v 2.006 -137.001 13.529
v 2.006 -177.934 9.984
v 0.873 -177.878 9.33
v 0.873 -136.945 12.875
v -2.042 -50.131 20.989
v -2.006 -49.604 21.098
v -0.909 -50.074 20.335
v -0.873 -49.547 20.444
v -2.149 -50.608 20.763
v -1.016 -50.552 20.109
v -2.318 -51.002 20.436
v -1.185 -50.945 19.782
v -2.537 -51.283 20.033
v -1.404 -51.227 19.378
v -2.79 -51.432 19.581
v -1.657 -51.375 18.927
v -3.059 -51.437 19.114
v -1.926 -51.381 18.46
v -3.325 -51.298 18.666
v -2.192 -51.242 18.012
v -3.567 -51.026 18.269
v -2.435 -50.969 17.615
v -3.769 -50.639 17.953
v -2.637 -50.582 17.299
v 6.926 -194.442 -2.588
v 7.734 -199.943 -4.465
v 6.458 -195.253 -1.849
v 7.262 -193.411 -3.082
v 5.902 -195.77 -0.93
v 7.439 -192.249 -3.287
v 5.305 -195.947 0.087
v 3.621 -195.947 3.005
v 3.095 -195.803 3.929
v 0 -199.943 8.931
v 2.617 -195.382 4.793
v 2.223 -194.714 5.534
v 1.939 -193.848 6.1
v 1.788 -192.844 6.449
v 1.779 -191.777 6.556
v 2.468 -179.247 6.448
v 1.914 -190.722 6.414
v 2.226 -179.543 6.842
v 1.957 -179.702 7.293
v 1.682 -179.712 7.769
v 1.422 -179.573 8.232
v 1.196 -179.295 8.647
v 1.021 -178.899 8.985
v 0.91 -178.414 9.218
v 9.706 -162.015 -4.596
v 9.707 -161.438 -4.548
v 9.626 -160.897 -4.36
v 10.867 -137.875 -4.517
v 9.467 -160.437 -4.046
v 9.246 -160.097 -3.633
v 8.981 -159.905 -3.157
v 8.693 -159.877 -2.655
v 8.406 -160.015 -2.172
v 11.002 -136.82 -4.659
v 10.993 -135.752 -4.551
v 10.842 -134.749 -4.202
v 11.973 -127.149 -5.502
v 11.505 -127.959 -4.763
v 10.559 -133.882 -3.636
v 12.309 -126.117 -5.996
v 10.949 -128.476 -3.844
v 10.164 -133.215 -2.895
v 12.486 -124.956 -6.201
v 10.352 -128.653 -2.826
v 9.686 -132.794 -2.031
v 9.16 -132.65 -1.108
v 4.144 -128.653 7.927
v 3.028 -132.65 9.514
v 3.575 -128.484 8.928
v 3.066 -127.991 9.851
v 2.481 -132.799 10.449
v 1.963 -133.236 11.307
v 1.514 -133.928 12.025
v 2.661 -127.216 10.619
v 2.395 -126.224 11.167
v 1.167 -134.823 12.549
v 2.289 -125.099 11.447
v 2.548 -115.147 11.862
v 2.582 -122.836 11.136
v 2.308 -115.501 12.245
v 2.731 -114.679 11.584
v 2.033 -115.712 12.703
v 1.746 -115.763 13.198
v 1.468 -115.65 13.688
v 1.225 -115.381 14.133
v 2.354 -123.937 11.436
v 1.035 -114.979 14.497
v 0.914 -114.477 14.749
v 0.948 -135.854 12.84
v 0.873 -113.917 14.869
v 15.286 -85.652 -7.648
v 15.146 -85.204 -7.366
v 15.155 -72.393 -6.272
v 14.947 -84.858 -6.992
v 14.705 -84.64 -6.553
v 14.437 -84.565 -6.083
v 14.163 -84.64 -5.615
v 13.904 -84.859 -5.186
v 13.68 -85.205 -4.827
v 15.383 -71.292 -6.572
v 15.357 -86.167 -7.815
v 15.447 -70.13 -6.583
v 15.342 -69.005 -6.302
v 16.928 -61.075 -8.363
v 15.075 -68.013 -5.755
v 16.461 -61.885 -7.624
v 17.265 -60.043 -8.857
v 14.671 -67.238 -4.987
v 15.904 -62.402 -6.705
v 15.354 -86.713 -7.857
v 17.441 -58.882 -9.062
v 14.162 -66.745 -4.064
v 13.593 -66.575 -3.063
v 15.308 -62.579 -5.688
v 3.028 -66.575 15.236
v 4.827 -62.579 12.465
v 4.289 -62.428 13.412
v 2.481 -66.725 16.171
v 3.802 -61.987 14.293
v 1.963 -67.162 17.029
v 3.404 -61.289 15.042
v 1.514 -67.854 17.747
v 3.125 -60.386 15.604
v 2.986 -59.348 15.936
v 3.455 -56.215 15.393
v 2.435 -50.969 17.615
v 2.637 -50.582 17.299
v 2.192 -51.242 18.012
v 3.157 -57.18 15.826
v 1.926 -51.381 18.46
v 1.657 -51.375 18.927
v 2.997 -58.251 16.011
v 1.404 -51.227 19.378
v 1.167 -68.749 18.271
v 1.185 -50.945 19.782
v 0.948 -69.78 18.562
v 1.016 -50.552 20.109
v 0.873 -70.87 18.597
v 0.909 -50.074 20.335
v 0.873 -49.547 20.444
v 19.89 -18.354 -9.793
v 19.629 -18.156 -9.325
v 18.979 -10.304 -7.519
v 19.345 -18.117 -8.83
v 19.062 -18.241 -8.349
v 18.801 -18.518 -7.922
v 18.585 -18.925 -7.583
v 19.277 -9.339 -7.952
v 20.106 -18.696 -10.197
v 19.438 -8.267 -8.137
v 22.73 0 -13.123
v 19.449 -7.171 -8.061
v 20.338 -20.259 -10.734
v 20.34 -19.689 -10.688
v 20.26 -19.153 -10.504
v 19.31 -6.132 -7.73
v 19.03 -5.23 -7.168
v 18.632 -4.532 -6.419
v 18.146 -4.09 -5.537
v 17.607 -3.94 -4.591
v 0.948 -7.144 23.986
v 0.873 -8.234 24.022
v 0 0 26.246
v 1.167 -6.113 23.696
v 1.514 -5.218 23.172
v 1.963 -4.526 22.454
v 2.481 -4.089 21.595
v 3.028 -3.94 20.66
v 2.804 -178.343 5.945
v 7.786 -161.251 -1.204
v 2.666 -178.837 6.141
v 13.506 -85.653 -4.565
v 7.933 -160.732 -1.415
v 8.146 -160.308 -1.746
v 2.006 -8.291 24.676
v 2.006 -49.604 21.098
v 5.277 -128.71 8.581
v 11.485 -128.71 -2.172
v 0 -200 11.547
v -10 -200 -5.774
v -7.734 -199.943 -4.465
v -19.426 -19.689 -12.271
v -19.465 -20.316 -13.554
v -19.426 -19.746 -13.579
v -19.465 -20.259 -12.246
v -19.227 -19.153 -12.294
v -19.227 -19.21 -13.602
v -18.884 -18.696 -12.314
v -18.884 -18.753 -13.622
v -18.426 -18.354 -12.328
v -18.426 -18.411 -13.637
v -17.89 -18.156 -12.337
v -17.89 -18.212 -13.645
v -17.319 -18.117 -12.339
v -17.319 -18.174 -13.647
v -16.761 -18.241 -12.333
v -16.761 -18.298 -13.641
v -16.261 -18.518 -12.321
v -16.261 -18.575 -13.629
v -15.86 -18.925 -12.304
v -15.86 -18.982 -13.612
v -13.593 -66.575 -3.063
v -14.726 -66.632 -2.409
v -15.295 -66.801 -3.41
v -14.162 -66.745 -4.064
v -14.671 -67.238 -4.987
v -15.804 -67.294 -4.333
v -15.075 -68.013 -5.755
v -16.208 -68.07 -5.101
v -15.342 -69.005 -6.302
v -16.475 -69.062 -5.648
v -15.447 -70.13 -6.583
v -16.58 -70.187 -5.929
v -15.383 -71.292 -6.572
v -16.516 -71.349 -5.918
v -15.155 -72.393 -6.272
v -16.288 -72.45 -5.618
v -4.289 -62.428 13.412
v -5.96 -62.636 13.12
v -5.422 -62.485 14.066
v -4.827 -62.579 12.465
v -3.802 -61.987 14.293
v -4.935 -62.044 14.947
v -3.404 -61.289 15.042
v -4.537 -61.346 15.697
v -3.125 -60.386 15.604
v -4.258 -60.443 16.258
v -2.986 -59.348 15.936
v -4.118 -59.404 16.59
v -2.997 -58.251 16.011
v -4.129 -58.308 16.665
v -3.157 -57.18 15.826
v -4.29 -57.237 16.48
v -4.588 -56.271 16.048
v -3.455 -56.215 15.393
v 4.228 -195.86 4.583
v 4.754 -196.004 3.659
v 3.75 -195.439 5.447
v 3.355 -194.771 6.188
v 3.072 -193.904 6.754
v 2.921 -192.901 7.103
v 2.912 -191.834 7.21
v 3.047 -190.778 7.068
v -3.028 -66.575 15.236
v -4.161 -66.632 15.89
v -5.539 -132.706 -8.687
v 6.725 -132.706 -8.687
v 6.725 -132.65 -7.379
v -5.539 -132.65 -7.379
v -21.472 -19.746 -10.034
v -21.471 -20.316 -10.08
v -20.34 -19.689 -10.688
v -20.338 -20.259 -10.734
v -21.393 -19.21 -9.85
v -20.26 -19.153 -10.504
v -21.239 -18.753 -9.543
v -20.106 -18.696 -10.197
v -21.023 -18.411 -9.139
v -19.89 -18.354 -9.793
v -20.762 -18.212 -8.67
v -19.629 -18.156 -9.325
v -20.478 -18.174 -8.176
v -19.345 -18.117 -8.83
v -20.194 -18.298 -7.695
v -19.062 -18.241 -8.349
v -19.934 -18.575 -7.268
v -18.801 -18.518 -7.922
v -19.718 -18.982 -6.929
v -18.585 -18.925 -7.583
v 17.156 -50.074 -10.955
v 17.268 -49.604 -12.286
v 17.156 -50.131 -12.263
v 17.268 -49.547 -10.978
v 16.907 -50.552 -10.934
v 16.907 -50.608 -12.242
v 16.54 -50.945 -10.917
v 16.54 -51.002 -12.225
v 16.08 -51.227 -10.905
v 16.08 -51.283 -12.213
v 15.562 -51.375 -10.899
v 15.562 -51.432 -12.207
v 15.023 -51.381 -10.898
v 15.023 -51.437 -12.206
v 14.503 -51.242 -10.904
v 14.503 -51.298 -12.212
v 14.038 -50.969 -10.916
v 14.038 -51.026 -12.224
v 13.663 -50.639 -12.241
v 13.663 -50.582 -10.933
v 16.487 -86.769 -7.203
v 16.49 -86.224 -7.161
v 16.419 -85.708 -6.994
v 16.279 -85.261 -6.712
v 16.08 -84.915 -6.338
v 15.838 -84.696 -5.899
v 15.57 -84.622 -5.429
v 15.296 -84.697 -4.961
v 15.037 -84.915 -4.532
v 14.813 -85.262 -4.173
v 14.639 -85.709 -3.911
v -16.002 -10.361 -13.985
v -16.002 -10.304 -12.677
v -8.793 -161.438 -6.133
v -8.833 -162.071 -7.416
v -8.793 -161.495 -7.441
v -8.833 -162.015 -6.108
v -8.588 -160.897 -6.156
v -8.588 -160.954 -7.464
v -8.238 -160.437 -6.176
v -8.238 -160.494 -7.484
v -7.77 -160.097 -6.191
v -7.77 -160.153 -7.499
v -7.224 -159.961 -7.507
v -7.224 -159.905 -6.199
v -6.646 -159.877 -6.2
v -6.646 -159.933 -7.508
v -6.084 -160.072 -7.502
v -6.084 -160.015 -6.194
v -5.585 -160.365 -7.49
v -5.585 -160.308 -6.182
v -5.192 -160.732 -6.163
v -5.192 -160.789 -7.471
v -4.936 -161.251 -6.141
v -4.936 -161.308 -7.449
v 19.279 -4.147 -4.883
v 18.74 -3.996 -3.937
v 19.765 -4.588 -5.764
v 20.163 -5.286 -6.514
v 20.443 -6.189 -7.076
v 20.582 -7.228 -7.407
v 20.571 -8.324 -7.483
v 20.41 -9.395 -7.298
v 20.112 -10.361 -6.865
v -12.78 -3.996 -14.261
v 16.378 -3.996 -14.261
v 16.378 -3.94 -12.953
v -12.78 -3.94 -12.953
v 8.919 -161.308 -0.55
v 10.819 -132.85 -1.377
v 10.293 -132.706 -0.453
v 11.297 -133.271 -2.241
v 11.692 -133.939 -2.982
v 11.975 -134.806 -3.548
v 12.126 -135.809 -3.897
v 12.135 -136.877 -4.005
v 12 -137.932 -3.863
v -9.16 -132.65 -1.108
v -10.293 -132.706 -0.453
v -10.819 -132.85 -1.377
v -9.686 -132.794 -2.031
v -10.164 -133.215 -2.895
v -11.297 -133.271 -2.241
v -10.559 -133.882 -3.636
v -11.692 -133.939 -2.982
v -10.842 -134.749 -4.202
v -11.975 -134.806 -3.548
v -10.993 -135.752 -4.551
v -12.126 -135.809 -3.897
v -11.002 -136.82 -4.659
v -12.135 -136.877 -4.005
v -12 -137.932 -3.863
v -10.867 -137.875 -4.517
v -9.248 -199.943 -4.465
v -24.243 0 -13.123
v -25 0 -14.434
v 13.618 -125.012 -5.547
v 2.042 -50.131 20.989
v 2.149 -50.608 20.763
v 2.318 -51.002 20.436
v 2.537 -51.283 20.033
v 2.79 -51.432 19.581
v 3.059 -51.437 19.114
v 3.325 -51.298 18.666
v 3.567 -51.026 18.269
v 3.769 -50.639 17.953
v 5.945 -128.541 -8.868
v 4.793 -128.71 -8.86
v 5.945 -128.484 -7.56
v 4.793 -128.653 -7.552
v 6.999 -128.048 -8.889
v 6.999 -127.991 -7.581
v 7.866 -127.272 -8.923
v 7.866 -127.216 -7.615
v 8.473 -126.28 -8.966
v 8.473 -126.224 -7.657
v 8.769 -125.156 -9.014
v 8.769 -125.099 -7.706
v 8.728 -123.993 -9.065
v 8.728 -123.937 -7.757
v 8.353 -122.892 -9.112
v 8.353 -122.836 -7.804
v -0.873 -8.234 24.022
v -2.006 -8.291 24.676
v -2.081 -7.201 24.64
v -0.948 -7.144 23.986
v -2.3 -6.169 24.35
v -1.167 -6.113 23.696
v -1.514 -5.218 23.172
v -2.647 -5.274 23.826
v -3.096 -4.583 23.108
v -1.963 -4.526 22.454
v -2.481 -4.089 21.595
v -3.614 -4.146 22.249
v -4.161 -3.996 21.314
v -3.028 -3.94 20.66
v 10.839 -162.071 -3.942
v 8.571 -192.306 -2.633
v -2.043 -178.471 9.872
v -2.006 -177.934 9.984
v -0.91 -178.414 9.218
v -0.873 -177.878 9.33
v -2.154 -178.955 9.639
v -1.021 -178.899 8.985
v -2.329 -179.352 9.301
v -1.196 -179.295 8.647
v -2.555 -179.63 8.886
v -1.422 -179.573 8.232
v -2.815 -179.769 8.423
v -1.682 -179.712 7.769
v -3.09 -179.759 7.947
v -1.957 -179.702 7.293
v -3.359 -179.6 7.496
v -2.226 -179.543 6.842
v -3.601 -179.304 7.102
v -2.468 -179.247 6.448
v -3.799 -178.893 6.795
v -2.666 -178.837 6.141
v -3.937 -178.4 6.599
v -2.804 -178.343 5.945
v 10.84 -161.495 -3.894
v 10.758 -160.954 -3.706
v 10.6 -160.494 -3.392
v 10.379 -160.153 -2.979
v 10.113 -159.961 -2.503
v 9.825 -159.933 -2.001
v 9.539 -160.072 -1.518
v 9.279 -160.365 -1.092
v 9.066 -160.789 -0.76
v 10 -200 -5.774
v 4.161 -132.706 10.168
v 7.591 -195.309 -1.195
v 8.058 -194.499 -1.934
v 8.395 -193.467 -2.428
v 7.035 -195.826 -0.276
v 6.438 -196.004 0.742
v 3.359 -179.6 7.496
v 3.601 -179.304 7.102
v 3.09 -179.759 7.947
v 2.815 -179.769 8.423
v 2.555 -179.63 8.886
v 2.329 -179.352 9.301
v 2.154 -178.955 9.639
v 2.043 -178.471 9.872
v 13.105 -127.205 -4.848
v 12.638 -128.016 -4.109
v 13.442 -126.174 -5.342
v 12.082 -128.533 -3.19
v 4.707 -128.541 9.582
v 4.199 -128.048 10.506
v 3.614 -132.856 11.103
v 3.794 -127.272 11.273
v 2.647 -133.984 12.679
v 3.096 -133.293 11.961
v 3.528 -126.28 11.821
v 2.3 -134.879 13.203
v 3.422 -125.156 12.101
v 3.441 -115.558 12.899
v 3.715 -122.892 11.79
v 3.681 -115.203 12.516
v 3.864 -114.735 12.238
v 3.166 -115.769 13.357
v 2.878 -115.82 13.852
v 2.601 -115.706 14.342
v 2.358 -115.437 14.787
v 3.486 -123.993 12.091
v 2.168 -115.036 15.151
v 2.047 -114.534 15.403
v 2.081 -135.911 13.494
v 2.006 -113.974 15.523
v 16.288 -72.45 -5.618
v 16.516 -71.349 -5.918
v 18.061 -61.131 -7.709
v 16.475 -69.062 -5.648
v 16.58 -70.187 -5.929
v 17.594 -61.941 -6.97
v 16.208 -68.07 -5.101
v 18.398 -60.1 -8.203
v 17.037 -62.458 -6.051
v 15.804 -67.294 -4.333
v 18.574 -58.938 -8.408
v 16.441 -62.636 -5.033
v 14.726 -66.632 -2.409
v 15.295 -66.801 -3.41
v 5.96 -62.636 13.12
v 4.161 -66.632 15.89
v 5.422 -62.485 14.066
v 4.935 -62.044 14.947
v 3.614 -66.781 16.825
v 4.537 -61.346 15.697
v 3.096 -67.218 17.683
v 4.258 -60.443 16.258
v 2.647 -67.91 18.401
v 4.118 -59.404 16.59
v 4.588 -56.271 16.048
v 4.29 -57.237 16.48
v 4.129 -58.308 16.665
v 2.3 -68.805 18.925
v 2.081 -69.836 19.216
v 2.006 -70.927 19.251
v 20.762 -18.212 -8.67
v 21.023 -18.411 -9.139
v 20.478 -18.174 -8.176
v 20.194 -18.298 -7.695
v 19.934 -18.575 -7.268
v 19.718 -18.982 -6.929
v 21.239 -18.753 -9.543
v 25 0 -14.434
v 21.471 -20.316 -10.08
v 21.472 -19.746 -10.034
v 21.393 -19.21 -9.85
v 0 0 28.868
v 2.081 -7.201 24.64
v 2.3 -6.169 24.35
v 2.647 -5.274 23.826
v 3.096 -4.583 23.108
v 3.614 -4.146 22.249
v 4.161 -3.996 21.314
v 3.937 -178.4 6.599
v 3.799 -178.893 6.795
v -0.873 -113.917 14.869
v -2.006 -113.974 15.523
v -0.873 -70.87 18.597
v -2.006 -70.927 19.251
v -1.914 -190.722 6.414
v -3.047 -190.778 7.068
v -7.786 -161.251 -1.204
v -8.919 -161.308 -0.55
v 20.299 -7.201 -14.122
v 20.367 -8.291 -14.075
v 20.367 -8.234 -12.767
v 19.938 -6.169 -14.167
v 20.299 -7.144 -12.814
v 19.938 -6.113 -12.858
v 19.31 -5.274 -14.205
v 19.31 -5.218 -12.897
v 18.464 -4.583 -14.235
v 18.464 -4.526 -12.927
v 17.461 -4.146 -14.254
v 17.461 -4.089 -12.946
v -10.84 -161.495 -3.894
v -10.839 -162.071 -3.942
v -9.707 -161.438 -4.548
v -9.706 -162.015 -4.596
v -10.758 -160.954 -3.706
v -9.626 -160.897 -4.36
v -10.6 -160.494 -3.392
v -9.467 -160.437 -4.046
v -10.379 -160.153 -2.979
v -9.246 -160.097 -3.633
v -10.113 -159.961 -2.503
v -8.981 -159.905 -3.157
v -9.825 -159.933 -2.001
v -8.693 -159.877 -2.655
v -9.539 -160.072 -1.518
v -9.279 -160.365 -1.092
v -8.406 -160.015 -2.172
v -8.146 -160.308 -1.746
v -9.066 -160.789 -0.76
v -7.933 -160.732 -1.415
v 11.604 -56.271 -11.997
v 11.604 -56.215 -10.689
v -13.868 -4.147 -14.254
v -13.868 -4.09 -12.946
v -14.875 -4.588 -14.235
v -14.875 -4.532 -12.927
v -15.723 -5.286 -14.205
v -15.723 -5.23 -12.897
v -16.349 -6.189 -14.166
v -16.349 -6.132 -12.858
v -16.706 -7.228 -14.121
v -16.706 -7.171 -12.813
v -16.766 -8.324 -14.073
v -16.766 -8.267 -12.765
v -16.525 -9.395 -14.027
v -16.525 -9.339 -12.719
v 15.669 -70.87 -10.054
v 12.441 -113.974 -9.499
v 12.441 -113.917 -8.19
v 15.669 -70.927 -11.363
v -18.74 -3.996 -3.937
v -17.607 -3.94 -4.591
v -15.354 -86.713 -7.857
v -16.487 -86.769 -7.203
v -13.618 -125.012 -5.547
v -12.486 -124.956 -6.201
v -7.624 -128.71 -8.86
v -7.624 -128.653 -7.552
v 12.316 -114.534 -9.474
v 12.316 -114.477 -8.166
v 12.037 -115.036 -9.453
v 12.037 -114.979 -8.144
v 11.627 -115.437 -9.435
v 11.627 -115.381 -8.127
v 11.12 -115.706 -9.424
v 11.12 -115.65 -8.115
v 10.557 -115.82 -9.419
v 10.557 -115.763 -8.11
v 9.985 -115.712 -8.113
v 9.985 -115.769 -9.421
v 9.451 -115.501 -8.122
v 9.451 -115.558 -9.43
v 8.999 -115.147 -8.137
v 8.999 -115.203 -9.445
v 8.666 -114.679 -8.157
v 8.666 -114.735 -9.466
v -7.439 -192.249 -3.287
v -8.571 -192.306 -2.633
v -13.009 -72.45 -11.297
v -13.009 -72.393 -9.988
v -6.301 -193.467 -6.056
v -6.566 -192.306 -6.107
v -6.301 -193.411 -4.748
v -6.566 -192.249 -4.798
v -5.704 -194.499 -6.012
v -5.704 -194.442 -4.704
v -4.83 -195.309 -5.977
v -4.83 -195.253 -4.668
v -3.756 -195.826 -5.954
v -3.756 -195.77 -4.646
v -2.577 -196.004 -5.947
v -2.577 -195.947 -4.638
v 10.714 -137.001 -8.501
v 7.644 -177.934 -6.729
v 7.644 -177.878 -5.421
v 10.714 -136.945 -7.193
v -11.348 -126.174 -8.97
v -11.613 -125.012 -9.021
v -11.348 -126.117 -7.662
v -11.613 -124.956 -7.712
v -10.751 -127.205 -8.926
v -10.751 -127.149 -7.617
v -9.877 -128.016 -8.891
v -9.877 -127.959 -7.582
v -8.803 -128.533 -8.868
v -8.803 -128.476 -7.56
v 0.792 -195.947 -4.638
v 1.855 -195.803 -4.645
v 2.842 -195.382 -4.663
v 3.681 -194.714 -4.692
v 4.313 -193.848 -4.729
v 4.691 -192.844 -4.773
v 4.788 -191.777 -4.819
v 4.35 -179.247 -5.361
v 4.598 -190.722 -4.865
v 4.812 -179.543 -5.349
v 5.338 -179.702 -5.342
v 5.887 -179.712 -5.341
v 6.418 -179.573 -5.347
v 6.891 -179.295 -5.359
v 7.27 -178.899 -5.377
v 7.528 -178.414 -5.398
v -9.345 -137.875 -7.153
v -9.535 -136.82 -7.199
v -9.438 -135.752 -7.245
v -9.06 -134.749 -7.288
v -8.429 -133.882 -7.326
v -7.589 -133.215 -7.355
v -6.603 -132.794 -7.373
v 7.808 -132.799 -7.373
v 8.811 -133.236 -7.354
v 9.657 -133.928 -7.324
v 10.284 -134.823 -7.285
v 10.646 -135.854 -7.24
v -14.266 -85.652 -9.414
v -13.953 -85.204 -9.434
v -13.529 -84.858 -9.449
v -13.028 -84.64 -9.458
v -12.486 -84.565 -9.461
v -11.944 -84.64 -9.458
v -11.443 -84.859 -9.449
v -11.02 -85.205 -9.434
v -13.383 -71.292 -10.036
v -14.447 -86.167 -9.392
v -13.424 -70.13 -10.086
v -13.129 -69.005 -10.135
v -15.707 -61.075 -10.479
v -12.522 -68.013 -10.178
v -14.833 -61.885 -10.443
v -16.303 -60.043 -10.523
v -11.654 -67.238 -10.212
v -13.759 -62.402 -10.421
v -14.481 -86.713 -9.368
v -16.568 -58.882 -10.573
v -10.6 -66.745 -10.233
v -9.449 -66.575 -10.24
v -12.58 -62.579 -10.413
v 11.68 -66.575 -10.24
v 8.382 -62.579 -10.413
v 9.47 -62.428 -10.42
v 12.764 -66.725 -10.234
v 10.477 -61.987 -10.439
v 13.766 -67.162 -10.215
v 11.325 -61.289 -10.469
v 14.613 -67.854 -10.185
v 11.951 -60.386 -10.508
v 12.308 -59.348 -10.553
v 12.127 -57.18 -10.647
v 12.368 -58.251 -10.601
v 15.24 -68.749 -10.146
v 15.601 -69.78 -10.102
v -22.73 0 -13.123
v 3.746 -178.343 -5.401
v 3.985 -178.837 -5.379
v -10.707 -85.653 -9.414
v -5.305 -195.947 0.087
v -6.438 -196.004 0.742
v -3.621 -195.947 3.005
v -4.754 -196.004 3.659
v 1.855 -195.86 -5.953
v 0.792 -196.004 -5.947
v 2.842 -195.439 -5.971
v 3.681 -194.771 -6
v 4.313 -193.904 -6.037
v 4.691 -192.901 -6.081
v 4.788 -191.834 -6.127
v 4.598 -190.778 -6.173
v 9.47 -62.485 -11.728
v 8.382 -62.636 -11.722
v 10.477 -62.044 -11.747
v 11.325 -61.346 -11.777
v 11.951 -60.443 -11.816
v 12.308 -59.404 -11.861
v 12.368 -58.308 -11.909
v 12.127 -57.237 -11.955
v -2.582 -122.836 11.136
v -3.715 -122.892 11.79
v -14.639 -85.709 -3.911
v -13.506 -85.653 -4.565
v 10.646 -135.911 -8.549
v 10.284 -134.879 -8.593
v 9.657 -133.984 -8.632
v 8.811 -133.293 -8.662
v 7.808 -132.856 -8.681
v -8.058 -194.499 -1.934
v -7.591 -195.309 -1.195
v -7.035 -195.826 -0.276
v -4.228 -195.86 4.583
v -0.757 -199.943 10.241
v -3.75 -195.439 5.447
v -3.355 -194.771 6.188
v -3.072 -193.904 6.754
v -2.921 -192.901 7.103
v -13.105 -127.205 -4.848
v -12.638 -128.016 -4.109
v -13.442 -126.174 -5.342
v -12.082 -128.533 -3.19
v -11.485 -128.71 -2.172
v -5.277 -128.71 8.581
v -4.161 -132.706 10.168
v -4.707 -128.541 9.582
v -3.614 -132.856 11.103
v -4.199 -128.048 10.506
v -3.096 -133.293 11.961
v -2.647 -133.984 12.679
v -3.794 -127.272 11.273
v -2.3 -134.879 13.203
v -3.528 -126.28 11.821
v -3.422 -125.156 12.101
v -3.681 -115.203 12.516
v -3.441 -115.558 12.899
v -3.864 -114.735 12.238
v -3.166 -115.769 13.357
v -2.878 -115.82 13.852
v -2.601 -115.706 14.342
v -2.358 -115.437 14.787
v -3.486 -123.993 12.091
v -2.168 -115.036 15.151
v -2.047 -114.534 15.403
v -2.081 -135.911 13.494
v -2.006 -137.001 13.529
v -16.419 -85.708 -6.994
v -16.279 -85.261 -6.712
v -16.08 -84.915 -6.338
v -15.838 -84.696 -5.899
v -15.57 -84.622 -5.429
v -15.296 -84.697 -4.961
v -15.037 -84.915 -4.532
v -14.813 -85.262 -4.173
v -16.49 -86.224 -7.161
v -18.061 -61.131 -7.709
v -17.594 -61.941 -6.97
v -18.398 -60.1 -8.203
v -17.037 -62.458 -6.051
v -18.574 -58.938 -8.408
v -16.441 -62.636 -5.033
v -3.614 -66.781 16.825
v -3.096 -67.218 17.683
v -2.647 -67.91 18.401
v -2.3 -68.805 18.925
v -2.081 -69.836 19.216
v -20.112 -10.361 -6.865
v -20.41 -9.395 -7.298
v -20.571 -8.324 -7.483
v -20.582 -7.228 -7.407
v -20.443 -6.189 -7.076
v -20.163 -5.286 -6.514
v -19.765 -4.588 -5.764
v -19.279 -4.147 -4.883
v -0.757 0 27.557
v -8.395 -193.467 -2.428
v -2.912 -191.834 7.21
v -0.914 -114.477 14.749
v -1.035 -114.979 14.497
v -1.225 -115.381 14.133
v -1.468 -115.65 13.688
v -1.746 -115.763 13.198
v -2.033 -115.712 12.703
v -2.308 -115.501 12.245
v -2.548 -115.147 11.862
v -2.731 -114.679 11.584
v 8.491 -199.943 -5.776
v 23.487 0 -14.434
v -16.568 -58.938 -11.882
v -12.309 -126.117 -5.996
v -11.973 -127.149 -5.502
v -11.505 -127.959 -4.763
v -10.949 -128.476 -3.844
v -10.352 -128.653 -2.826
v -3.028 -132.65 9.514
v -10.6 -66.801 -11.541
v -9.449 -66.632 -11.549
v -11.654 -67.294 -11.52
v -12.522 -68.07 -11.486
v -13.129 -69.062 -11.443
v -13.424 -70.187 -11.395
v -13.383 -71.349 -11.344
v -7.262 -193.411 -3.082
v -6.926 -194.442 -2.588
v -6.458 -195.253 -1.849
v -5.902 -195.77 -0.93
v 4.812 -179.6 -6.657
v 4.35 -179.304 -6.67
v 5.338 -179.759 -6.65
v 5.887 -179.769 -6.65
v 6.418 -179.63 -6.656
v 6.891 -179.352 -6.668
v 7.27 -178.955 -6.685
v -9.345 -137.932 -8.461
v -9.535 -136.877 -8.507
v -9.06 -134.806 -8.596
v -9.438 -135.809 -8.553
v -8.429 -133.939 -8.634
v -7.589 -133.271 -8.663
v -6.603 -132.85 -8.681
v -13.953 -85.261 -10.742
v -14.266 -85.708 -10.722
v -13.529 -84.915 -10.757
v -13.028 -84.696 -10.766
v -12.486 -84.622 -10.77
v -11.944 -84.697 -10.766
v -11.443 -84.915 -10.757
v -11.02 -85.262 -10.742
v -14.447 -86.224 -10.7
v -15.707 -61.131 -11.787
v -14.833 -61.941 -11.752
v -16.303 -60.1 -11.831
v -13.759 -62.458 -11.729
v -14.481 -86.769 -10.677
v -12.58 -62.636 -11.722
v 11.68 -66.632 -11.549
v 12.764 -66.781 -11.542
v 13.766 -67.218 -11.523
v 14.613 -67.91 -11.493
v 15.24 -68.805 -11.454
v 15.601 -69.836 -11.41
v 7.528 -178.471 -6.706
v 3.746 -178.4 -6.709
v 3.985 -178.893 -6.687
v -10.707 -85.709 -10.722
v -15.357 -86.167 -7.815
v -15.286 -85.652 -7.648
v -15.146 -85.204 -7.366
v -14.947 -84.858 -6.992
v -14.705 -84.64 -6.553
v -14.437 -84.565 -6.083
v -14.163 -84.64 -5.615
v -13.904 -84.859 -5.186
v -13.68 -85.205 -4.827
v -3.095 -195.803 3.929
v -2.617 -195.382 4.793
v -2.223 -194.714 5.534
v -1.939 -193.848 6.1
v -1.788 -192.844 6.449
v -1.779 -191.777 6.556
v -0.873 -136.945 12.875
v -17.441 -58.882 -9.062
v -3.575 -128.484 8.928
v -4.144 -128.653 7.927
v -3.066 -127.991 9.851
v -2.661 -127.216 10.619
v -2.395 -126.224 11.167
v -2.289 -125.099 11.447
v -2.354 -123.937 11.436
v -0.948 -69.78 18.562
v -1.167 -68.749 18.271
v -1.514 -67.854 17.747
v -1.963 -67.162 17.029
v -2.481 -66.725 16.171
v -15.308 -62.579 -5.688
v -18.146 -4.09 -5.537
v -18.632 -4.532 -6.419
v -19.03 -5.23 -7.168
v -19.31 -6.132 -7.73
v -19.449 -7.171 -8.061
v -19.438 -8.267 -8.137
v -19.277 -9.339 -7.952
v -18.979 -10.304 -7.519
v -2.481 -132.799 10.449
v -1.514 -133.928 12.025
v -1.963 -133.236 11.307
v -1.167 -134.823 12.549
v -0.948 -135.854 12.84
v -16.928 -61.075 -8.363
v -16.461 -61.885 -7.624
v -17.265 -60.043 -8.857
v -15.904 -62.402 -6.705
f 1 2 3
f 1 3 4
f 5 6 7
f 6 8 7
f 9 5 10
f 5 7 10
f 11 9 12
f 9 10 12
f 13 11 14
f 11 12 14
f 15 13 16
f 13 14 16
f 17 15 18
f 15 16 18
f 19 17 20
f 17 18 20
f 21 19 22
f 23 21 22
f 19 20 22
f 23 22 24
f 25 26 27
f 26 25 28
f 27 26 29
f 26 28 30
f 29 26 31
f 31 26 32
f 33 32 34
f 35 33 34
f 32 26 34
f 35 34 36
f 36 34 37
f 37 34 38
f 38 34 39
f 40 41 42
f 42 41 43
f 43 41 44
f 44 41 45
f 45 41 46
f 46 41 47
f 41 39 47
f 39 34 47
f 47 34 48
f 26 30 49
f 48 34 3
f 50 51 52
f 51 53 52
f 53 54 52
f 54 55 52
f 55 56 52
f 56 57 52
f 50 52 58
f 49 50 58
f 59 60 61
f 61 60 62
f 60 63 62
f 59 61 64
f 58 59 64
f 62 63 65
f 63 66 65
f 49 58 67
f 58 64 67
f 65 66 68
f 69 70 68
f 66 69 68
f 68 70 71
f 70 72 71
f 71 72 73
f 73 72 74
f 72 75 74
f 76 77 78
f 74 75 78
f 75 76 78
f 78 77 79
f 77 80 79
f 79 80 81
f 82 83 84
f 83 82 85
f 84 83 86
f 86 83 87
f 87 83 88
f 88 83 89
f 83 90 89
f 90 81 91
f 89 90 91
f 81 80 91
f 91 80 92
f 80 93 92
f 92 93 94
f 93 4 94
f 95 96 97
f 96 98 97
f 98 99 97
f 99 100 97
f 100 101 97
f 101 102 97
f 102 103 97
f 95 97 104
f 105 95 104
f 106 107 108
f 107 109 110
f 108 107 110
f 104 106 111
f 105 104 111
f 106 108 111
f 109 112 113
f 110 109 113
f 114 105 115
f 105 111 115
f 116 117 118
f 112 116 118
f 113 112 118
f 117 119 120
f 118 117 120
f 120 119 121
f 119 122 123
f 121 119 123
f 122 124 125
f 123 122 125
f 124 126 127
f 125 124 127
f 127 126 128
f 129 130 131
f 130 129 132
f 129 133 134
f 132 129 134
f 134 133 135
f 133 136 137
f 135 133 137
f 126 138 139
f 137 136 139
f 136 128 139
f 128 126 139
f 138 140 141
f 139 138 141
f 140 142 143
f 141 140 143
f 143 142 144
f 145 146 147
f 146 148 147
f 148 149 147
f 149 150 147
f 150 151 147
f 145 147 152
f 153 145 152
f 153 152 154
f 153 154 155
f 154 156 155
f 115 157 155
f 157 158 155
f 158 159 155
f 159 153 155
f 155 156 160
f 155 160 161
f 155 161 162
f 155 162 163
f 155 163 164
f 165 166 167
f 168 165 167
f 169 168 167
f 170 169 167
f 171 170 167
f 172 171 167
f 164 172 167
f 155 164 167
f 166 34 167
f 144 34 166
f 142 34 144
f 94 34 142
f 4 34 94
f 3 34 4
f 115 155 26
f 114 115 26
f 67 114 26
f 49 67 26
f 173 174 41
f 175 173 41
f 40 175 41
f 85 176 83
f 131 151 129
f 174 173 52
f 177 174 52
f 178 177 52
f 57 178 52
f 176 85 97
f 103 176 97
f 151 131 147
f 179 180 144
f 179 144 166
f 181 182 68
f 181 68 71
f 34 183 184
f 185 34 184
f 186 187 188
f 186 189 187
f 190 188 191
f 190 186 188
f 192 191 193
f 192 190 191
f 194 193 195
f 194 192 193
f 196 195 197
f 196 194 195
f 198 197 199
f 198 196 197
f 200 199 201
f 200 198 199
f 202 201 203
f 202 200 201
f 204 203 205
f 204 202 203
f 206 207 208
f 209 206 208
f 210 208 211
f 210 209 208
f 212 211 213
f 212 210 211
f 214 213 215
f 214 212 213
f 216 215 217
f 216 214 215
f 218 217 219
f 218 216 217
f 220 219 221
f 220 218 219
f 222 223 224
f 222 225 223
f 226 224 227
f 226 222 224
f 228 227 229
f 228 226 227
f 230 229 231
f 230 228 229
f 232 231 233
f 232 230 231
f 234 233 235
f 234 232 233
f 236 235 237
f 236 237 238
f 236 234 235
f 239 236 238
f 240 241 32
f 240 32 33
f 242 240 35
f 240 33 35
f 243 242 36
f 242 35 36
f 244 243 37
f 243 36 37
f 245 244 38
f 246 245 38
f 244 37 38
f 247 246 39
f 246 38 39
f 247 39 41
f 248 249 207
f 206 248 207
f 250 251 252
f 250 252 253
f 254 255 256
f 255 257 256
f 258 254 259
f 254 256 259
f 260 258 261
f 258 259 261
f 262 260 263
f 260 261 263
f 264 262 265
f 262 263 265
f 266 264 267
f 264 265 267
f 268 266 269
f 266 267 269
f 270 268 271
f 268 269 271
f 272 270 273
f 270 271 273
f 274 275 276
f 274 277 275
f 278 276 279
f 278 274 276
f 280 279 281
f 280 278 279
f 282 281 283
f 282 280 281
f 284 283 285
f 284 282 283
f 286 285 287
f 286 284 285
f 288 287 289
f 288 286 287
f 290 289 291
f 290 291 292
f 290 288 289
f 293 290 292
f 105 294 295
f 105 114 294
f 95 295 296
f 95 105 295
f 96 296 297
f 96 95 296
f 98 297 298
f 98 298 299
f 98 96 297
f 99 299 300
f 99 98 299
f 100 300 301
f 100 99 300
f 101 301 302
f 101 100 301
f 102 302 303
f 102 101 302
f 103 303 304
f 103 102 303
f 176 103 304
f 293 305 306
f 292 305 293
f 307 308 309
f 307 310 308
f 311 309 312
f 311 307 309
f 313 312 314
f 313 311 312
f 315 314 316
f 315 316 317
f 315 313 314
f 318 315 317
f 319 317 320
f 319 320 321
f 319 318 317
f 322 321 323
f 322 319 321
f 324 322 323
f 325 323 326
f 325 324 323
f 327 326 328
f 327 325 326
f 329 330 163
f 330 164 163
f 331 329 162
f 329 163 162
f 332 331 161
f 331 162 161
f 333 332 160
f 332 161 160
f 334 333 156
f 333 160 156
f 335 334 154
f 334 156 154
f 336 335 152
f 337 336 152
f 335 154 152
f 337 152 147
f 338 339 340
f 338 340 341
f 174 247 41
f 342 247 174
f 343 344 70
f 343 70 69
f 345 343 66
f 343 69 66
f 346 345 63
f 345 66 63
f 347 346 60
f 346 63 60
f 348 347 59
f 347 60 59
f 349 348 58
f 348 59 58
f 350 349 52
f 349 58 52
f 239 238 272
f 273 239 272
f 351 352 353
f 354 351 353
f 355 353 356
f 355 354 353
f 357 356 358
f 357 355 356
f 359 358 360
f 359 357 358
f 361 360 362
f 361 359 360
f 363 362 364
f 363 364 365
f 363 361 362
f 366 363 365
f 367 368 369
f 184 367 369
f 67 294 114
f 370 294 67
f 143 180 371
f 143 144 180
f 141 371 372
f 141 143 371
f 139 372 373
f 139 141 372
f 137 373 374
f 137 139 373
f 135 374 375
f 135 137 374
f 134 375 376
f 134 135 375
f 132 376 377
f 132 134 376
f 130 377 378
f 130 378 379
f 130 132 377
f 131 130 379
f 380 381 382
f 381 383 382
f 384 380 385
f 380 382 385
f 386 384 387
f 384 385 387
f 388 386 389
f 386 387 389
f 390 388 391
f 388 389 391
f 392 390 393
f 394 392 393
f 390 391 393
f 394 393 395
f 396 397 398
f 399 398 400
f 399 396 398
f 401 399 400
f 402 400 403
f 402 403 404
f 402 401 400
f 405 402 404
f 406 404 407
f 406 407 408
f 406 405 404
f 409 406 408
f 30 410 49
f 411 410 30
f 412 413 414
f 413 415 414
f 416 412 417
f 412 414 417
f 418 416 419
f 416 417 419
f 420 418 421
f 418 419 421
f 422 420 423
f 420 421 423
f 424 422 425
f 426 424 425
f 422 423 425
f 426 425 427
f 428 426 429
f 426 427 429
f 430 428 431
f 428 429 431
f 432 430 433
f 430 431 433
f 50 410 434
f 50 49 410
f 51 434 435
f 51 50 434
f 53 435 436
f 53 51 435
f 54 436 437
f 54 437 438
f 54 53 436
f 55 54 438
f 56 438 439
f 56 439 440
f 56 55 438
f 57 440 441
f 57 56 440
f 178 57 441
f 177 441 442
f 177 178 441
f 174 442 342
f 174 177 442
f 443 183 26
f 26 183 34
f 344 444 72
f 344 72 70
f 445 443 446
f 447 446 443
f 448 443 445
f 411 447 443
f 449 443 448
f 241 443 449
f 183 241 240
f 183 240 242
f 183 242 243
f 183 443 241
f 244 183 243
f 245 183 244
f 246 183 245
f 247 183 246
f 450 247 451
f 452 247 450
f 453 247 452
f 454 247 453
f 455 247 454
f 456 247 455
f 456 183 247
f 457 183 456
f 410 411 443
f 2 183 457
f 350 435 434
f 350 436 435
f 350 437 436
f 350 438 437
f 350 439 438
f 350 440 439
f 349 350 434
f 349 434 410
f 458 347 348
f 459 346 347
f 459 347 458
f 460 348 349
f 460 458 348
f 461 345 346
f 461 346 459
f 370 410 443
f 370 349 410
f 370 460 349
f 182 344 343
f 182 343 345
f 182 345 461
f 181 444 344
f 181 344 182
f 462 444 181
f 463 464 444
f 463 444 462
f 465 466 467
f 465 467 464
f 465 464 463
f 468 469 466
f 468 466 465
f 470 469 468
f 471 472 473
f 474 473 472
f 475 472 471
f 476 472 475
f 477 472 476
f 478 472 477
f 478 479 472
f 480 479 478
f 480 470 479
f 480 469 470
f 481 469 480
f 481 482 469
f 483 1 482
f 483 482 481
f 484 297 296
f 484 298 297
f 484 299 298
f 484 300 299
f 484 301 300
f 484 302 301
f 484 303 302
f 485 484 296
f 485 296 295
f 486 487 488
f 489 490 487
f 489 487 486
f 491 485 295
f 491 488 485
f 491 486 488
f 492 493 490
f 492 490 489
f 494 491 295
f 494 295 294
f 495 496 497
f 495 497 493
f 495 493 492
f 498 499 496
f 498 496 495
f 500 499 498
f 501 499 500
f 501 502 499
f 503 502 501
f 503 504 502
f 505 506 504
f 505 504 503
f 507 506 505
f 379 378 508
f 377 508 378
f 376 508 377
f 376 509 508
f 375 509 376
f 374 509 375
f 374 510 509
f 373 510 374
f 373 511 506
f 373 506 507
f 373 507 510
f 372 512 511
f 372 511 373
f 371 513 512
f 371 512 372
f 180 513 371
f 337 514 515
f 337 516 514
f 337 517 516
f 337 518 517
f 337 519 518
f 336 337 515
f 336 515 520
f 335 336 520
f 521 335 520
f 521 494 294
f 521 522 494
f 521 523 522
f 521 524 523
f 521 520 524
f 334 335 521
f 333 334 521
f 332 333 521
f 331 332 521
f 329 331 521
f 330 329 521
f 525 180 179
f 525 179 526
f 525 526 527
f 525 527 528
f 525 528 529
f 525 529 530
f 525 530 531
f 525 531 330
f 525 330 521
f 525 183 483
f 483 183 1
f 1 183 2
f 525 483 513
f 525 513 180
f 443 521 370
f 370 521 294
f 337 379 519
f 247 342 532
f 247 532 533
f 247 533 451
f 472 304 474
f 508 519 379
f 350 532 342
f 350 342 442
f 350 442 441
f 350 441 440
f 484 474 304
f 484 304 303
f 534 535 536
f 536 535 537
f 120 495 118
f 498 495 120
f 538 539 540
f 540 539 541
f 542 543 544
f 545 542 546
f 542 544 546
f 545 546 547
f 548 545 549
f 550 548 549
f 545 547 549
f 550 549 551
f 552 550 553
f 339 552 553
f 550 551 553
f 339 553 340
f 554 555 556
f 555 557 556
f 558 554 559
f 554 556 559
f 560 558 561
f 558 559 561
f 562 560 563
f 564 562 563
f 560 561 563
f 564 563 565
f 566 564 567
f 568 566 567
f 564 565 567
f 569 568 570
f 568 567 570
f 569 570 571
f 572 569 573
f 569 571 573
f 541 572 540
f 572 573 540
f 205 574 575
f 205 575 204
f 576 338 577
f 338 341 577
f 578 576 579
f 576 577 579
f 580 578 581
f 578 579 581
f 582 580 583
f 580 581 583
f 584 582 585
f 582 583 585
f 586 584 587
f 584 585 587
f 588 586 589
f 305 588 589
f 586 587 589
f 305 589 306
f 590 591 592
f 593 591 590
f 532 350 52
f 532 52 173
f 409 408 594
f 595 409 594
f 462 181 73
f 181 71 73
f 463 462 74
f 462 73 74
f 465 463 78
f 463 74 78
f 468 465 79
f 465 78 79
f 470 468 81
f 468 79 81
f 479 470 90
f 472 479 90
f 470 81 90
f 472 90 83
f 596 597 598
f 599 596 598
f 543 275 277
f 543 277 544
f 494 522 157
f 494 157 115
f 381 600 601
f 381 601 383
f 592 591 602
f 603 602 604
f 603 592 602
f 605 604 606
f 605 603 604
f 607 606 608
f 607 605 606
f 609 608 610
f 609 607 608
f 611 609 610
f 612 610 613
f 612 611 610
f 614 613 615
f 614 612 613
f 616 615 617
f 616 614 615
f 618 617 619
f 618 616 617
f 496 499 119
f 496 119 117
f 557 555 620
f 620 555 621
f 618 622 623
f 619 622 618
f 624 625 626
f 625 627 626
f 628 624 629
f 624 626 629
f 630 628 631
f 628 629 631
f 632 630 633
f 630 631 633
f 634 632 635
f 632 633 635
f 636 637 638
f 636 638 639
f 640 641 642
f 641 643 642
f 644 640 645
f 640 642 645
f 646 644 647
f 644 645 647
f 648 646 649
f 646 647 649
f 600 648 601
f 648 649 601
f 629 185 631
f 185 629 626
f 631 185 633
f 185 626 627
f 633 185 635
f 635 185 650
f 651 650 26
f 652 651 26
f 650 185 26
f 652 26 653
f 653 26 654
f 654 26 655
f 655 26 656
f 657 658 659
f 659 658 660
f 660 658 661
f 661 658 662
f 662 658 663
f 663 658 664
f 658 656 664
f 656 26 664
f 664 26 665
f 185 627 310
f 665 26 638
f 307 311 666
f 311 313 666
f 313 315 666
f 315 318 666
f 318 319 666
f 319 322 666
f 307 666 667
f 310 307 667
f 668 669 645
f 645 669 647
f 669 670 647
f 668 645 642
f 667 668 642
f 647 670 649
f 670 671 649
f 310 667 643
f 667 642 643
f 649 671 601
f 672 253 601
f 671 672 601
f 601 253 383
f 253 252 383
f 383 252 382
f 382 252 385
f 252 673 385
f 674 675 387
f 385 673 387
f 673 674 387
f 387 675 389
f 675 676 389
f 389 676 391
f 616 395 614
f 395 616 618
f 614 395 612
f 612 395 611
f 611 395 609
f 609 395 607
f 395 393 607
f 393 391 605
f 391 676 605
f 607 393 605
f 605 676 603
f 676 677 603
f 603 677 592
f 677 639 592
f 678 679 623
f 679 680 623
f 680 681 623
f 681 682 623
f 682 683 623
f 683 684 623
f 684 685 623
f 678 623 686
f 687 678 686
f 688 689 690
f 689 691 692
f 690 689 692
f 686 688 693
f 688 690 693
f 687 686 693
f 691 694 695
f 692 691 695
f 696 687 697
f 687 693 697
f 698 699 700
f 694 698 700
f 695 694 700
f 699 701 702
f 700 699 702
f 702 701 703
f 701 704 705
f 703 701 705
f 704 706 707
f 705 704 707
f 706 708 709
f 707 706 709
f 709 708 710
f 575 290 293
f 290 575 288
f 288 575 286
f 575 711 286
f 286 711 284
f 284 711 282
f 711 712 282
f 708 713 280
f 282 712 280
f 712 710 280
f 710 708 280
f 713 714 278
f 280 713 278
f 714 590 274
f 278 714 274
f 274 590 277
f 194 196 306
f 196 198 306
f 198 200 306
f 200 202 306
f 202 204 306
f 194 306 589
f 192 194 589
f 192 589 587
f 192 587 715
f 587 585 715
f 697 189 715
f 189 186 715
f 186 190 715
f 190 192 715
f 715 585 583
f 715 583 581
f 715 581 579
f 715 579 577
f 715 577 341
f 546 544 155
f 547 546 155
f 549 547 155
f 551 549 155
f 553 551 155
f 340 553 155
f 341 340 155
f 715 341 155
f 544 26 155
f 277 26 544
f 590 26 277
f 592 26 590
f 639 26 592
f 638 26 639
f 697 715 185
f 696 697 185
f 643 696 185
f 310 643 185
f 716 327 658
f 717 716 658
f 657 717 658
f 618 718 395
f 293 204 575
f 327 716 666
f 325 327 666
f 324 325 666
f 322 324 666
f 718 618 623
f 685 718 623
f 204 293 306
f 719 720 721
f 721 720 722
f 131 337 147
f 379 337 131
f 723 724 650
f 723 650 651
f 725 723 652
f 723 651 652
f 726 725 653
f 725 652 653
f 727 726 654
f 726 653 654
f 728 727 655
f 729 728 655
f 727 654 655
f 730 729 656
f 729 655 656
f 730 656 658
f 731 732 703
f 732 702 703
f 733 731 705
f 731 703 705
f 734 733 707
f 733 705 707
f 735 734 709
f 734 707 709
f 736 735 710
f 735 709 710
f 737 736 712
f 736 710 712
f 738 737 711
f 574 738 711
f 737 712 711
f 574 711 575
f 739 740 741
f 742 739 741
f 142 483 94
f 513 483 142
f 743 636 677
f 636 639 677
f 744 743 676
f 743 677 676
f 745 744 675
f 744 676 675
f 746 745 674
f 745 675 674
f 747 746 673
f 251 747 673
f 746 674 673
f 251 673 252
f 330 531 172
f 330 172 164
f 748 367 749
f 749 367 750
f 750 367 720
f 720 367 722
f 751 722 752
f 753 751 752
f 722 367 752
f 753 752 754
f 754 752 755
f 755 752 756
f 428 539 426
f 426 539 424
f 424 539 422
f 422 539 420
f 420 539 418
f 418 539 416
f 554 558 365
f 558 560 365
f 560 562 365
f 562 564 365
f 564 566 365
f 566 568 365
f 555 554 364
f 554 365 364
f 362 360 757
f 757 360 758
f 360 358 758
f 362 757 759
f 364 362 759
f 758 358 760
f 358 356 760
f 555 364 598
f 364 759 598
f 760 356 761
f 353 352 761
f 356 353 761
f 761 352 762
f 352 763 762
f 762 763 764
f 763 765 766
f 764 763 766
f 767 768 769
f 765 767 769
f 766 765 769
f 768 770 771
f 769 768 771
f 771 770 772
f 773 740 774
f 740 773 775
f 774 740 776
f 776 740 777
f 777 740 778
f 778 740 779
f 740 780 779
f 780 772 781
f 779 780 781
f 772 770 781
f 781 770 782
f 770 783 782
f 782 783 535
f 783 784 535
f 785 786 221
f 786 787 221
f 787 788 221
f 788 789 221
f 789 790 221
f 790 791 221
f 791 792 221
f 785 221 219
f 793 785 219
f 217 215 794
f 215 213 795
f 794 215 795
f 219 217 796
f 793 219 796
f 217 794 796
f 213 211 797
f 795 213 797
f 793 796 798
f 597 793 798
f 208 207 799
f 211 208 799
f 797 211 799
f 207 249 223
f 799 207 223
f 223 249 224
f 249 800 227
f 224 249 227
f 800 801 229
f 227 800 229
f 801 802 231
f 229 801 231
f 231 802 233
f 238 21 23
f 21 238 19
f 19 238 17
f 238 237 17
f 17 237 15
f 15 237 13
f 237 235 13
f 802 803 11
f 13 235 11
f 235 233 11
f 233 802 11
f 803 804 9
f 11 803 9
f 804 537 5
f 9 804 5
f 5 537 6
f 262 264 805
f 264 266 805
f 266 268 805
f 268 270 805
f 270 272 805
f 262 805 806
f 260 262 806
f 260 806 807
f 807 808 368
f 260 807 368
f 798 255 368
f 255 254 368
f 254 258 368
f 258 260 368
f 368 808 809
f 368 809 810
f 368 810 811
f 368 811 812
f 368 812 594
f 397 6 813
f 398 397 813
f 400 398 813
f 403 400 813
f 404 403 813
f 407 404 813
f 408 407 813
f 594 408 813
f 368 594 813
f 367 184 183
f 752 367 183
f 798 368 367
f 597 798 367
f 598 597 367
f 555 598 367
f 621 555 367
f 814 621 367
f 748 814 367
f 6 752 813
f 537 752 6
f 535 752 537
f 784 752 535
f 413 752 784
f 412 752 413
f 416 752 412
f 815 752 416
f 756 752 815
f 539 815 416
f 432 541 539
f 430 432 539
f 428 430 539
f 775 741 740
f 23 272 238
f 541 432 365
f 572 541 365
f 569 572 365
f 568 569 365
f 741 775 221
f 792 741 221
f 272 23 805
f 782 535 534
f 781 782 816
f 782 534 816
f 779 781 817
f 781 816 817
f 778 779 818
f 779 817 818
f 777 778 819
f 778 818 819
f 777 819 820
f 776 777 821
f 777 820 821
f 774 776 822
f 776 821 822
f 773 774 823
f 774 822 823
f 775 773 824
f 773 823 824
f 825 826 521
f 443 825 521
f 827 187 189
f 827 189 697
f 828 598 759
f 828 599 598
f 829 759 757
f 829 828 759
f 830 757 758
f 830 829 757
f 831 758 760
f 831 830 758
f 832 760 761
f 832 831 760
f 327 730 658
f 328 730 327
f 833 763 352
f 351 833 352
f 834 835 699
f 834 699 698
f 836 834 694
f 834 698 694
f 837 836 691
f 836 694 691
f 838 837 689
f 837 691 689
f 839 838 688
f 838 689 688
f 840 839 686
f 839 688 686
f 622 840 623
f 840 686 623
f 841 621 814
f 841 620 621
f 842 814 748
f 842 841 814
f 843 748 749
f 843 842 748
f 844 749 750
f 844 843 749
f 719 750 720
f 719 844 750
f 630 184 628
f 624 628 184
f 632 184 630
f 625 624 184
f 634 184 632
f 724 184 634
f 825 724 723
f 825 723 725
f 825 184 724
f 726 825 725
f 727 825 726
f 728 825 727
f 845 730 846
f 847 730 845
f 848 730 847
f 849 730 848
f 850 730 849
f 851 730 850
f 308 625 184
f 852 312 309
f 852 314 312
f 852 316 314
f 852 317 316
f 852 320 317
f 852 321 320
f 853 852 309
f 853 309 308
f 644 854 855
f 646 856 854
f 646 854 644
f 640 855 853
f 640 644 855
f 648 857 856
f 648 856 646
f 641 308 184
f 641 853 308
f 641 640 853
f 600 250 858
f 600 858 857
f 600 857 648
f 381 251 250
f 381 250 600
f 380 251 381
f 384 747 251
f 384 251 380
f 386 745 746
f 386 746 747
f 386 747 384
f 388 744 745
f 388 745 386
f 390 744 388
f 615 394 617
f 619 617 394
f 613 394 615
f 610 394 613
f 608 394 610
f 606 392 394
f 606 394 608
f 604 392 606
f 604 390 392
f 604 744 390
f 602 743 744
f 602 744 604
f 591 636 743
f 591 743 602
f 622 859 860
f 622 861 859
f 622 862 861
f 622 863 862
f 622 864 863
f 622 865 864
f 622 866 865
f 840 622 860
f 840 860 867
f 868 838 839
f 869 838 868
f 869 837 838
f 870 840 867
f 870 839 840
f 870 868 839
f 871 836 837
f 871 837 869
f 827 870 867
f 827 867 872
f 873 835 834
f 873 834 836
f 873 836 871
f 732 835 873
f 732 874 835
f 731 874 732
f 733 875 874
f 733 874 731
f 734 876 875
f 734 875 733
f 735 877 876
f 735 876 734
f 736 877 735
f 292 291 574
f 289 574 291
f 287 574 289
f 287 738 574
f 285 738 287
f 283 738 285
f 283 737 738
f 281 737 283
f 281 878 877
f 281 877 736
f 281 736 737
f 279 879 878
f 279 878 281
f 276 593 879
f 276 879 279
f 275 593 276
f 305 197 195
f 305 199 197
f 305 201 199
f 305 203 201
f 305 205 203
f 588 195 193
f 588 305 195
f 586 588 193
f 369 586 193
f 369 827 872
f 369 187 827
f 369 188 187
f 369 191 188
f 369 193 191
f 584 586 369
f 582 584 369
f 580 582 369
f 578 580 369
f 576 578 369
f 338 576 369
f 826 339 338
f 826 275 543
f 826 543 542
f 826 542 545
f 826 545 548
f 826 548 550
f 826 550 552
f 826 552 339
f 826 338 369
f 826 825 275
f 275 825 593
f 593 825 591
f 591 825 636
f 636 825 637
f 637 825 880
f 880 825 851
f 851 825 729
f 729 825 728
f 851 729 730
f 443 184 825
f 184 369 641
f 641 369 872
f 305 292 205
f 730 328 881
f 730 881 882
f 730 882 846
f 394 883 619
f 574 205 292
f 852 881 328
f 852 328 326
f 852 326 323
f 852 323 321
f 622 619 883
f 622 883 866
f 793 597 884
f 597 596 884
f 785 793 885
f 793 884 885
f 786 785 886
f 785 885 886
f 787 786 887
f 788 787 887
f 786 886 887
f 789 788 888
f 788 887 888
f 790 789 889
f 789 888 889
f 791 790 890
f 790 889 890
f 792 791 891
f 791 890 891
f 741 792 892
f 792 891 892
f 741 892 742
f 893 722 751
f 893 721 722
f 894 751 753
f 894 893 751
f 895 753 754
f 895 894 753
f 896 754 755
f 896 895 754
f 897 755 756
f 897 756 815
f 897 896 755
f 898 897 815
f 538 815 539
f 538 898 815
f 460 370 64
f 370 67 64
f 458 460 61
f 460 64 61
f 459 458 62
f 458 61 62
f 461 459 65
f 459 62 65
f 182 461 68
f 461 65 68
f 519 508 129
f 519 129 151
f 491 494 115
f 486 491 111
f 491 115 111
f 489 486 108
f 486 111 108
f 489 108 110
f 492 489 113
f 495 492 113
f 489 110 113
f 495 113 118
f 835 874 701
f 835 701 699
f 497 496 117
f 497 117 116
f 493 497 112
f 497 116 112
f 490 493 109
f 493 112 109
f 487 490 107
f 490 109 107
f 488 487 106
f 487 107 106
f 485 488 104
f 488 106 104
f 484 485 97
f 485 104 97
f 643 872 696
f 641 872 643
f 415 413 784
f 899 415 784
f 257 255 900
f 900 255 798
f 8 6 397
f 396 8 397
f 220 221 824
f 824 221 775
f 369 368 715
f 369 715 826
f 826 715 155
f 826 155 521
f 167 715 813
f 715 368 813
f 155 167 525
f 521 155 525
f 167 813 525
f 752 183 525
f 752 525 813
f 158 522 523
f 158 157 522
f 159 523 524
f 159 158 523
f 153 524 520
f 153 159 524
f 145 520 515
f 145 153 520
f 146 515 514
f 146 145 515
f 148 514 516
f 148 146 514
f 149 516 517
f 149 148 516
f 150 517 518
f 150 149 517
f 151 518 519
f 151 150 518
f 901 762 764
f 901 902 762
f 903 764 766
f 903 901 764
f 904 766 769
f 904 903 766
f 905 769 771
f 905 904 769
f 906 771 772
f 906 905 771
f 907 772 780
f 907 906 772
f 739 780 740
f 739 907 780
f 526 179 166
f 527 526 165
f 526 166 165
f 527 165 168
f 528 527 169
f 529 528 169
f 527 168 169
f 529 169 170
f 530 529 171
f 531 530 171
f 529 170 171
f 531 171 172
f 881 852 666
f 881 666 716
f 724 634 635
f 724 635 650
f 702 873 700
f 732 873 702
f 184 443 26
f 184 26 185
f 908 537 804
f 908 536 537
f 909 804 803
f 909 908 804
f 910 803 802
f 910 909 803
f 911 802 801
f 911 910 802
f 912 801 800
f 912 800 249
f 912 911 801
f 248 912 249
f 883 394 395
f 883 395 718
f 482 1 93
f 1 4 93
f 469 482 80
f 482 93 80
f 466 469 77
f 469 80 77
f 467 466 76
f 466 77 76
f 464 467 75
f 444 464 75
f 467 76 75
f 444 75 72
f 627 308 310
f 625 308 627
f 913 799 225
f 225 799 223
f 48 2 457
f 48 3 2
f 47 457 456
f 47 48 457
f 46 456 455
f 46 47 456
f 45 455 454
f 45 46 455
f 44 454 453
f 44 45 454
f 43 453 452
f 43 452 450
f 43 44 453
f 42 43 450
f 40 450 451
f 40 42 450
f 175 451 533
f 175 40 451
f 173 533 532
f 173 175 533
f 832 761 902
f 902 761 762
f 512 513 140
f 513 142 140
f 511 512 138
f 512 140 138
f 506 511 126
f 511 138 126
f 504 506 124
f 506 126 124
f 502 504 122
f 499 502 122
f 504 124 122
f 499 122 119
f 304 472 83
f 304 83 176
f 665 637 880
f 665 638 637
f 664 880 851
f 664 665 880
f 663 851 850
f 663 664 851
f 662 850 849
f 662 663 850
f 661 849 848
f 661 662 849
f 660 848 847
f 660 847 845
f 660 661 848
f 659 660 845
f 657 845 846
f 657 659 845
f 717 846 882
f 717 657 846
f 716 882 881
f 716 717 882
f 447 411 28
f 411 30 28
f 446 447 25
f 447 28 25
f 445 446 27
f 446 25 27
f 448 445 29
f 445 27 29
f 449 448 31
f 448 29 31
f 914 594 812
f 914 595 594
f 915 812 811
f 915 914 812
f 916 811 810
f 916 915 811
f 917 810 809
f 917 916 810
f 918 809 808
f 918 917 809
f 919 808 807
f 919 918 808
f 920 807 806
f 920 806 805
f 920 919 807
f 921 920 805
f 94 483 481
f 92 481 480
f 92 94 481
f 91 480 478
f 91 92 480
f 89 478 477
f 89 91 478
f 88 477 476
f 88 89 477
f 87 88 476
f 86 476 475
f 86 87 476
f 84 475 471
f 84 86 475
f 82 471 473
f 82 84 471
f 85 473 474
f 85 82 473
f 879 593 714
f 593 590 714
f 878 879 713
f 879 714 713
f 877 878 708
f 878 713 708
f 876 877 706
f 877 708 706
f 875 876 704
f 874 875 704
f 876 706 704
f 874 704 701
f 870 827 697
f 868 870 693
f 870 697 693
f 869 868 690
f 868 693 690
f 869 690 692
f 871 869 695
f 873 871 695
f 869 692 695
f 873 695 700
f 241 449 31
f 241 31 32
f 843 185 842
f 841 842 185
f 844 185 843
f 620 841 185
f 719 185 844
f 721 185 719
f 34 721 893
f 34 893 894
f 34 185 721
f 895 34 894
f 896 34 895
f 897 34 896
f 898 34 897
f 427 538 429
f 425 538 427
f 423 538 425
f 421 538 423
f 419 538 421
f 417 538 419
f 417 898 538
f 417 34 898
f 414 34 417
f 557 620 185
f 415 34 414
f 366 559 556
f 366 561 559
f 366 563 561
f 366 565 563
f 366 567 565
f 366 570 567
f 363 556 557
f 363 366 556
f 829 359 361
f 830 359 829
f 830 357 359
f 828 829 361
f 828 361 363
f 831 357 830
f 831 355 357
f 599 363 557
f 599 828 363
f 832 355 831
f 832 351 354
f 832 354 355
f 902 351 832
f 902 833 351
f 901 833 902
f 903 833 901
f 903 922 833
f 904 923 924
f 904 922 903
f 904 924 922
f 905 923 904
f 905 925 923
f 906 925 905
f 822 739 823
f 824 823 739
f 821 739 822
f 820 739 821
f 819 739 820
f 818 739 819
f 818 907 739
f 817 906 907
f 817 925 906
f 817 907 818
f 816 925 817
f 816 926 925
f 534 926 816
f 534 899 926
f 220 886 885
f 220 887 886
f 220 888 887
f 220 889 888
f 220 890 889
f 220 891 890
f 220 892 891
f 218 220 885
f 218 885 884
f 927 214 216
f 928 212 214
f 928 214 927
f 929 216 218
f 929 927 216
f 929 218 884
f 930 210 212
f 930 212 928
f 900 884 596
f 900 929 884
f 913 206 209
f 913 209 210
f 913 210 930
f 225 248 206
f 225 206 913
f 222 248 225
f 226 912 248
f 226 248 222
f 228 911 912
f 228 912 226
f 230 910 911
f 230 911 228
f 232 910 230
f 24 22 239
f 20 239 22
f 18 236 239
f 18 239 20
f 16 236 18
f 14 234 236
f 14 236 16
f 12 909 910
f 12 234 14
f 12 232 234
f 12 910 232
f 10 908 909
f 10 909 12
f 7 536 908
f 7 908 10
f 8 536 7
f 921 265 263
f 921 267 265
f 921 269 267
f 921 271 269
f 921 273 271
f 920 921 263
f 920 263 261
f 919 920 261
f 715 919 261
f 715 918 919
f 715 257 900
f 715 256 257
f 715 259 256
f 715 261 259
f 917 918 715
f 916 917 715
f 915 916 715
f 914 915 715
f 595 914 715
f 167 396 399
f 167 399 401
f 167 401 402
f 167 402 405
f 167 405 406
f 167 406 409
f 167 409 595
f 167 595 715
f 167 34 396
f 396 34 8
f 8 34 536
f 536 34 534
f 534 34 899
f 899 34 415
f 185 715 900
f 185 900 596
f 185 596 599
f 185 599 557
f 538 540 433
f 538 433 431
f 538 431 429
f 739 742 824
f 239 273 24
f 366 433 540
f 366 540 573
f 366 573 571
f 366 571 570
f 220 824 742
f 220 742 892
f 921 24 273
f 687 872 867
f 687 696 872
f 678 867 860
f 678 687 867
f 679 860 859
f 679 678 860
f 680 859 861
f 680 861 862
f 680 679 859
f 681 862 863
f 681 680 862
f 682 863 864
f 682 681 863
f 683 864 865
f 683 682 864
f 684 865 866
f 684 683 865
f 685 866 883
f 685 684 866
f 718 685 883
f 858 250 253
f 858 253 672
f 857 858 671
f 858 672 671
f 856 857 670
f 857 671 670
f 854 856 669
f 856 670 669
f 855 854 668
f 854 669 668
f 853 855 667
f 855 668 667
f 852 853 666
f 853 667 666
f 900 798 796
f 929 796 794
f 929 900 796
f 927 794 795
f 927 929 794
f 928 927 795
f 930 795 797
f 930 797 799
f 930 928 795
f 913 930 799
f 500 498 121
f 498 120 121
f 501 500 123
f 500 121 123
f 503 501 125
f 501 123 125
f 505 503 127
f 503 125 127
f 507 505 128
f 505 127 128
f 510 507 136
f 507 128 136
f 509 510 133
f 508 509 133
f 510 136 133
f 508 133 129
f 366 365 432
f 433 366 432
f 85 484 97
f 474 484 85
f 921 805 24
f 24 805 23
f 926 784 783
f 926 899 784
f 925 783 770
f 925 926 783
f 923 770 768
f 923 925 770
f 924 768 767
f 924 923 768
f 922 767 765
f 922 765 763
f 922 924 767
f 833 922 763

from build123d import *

# Parameters (mm, degrees)
F12_DEPTH = 1.3094010768
F13_R     = 4
F14_R     = 2
F15_COUNT = 3


with BuildPart() as f12:
    # F11 (on 3pt) → F12 (new body)
    with BuildSketch(Plane(origin=(12.4766063631, -0.6238303182, 7.2033720423), x_dir=(0.0374648931, 0.9990638163, 0.0216303661), z_dir=(0.8652146449, -0.0432607322, 0.4995319082))):
        Polygon((-199.5629973065, -10), (0.6244148852, -25), (0.6244148852, 25), (-199.5629973065, 10), align=None)
        Polygon((-195.5629973065, -6.2885059162), (-195.5629973065, 6.2885059162), (-187.6440477443, 6.881871114), (-132.2063387469, 11.0358067979), (-128.2063387469, 11.3355259428), (-120.5510228532, 11.9091371262), (-66.0701318871, 15.9913786395), (-62.0701318871, 16.2910977844), (-54.4132921405, 16.8648231497), (-3.3755851148, 20.6890676264), (-3.3755851148, -20.6890676264), (-12.7686794815, -19.9852450736), (-62.0701318871, -16.2910977844), (-66.0701318871, -15.9913786395), (-76.3495546331, -15.2211436906), (-128.2063387469, -11.3355259428), (-132.2063387469, -11.0358067979), (-144.9052103128, -10.0842830662), align=None, mode=Mode.SUBTRACT)
        Polygon((-187.6440477443, 6.881871114), (-195.5629973065, 6.2885059162), (-144.9052103128, -10.0842830662), (-132.2063387469, -11.0358067979), align=None)
        Polygon((-128.2063387469, 11.3355259428), (-132.2063387469, 11.0358067979), (-132.2063387469, -11.0358067979), (-128.2063387469, -11.3355259428), align=None)
        Polygon((-120.5510228532, 11.9091371262), (-128.2063387469, 11.3355259428), (-76.3495546331, -15.2211436906), (-66.0701318871, -15.9913786395), align=None)
        Polygon((-62.0701318871, 16.2910977844), (-66.0701318871, 15.9913786395), (-66.0701318871, -15.9913786395), (-62.0701318871, -16.2910977844), align=None)
        Polygon((-54.4132921405, 16.8648231497), (-62.0701318871, 16.2910977844), (-12.7686794815, -19.9852450736), (-3.3755851148, -20.6890676264), align=None)
    extrude(amount=-F12_DEPTH)

    # F13
    f13_edges = [f12.edges().sort_by_distance(p)[0] for p in [
        (7.727656, -195.975422, -2.799777),
        (12.474957, -132.678077, -5.540632),
        (12.774676, -128.681822, -5.713675),
        (22.128218, -3.967932, -11.113945),
        (1.43915, -3.967932, 24.720571),
        (1.43915, -66.603786, 19.296147),
        (1.43915, -62.60753, 19.642233),
        (1.43915, -195.975422, 8.092235),
        (1.43915, -132.678077, 13.573946),
        (1.43915, -128.681822, 13.920032),
        (17.430529, -66.603786, -8.401733),
        (17.730248, -62.60753, -8.574776),
    ]]
    fillet(f13_edges, radius=F13_R)

    # F14
    f14_edges = [f12.edges().sort_by_distance(p)[0] for p in [
        (1.43915, -121.033672, 14.582381),
        (1.43915, -188.063886, 8.777394),
        (11.523433, -145.36506, -4.99127),
        (16.660294, -76.873585, -7.957038),
        (1.43915, -54.957859, 20.304714),
        (21.424395, -13.352233, -10.707593),
    ]]
    fillet(f14_edges, radius=F14_R)


with BuildPart() as f15_1:
    # F15: instance of F12
    add(f12.part.rotate(Axis((0, -100, 0), (0, -1, 0)), 1 * 360 / F15_COUNT))


with BuildPart() as f15_2:
    # F15: instance of F12
    add(f12.part.rotate(Axis((0, -100, 0), (0, -1, 0)), 2 * 360 / F15_COUNT))


with BuildPart() as f17_1:
    # F17: instance of F12
    add(f12.part.mirror(Plane.YZ))


with BuildPart() as f18_tool:
    # F6 (on Front) → F18 section 0
    with BuildSketch(Plane.XZ):
        Polygon((-25, -14.4337567297), (25, -14.4337567297), (0, 28.8675134595), align=None)
    # F8 (on offset) → F18 section 1
    with BuildSketch(Plane.XZ.offset(200)):
        Polygon((10, -5.7735026919), (0, 11.5470053838), (-10, -5.7735026919), align=None)
    loft()


with BuildPart() as f12_1:
    add(f12.part)

    # F18: intersect by f18_tool
    add(f18_tool.part, mode=Mode.INTERSECT)


with BuildPart() as f15_2_1:
    add(f15_2.part)

    # F18: intersect by f18_tool
    add(f18_tool.part, mode=Mode.INTERSECT)


with BuildPart() as f17_1_1:
    add(f17_1.part)

    # F18: intersect by f18_tool
    add(f18_tool.part, mode=Mode.INTERSECT)


with BuildPart() as f12_2:
    add(f12_1.part)

    # F19: union F15_2, F17_1
    add(f15_2_1.part)
    add(f17_1_1.part)


solid = f12_2.part
